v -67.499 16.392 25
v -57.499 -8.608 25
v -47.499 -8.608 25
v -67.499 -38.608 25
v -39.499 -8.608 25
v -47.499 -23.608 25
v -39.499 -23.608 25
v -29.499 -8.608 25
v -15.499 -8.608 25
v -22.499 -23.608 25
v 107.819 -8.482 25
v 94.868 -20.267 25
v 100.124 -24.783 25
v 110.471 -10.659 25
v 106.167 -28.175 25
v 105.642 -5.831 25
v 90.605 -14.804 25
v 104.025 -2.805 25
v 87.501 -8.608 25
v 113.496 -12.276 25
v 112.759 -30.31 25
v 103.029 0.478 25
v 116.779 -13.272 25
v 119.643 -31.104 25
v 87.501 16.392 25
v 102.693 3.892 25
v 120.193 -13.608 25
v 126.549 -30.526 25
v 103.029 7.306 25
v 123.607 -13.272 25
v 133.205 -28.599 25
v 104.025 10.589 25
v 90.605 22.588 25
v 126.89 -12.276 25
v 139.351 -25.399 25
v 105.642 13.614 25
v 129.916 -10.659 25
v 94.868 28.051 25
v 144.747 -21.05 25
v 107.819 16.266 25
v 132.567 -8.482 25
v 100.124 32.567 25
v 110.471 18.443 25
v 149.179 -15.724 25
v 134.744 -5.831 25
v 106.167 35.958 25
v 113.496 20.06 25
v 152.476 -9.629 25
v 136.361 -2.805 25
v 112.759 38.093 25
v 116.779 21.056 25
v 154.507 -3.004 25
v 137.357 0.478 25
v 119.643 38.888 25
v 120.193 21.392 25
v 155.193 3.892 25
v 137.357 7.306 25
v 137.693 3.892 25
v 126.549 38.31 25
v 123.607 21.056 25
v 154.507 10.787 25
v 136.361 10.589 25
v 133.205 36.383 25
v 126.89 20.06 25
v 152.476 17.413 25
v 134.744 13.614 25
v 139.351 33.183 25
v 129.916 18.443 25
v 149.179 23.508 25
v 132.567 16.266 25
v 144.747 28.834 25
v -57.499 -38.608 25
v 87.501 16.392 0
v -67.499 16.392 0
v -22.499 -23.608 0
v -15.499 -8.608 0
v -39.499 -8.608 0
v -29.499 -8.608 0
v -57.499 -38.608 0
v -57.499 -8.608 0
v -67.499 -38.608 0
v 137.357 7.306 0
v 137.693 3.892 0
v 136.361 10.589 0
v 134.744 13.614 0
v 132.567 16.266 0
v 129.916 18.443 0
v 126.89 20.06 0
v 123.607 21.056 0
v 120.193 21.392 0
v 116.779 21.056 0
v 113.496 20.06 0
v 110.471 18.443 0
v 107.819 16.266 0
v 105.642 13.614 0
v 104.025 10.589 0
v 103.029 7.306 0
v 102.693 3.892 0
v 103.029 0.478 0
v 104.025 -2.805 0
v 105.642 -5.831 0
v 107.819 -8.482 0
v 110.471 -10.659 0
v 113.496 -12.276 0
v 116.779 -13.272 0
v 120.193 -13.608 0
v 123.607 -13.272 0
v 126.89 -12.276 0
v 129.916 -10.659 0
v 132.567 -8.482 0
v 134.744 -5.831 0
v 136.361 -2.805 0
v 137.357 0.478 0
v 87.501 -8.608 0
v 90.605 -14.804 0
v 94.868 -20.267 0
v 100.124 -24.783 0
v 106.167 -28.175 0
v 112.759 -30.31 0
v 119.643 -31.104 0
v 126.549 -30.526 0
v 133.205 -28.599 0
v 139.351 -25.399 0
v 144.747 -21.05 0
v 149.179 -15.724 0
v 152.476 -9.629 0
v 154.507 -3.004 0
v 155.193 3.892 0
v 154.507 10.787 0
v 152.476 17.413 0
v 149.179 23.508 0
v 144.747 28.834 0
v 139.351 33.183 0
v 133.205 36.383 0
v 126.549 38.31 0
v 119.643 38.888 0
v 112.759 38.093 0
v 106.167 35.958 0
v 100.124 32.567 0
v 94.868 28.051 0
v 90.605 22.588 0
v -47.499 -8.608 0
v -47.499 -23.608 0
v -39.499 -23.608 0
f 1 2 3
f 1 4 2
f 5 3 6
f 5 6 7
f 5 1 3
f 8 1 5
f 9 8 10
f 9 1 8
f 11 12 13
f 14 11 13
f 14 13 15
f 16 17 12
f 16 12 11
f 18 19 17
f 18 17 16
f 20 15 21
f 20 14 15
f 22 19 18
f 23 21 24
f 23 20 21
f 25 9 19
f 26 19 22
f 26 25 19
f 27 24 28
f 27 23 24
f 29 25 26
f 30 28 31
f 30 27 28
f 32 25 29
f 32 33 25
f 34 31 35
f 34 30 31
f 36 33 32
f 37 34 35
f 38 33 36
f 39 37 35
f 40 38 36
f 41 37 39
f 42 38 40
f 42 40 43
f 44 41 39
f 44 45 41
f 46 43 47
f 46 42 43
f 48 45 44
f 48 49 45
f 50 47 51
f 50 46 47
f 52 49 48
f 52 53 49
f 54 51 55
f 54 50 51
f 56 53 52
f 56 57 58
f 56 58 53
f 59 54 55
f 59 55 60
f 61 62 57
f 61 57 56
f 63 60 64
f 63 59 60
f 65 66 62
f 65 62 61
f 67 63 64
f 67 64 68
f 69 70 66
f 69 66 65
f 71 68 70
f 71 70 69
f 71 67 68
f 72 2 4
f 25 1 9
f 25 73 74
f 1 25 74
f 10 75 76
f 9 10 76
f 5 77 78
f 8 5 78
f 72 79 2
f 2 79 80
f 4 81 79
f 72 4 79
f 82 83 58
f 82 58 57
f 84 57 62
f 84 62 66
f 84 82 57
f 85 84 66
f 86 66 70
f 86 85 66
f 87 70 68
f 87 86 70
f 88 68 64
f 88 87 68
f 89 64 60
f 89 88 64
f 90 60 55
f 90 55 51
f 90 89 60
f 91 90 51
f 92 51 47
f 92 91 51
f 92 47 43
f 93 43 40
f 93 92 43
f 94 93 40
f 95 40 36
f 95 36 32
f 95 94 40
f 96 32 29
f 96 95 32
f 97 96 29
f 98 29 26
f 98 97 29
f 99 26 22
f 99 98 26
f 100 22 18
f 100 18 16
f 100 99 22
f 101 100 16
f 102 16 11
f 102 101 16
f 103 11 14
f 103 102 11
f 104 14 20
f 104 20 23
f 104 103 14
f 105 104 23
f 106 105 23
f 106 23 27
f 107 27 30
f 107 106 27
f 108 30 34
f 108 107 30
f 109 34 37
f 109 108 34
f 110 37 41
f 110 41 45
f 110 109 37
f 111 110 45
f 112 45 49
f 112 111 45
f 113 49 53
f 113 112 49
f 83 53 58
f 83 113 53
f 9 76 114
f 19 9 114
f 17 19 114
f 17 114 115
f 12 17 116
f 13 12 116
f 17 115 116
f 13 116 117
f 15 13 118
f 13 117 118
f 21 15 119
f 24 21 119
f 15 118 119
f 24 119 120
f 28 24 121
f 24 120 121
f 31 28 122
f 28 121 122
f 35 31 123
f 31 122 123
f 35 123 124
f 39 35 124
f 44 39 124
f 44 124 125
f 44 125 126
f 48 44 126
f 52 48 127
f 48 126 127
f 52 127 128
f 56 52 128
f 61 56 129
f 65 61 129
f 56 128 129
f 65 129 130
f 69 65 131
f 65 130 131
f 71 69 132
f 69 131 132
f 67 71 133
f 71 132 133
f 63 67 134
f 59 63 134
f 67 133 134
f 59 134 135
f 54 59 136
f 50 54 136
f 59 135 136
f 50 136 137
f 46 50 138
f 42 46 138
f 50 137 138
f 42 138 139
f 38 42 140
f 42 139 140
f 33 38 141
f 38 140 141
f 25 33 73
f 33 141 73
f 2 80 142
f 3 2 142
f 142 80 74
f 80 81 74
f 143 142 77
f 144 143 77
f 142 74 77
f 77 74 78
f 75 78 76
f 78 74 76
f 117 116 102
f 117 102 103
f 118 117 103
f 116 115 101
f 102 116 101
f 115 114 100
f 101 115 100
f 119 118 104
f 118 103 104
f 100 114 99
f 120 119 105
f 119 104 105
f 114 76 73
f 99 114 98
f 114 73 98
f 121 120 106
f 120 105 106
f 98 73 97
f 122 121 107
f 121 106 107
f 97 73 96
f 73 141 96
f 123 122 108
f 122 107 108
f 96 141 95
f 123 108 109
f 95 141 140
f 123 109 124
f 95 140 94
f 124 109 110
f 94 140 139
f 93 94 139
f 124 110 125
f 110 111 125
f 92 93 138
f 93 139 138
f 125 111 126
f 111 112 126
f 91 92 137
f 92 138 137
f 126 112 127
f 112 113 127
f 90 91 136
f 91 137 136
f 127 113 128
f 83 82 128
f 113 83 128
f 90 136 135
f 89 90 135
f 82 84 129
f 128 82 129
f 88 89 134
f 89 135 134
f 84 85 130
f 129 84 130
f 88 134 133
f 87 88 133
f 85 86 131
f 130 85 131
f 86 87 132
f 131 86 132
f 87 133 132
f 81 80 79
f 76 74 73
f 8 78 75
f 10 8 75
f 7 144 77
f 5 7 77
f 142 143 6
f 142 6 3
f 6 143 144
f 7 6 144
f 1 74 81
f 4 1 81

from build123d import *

# Parameters (mm, degrees)
F0_W     = 10
F0_H     = 30
F0_W_2   = 8
F0_H_2   = 15
F0_R     = 17.5
F1_DEPTH = 25


# Not quite as in the source:
# - a feature of the source that left no trace in its solid (it failed there, or was rolled back) is left out


with BuildPart() as f1:
    # F0 (on Top) → F1 (new body)
    with BuildSketch(Plane.XY):
        with Locations((-62.4986458628, -23.6081185268)):
            Rectangle(F0_W, F0_H)
        with Locations((-43.4986458628, -16.1081185268)):
            Rectangle(F0_W_2, F0_H_2)
        Polygon((87.5013541372, 16.3918814732), (-67.4986458628, 16.3918814732), (-67.4986458628, -8.6081185268), (-57.4986458628, -8.6081185268), (-47.4986458628, -8.6081185268), (-39.4986458628, -8.6081185268), (-29.4986458628, -8.6081185268), (-15.4986458628, -8.6081185268), (87.5013541372, -8.6081185268), align=None)
        Polygon((-22.4986458628, -23.6081185268), (-15.4986458628, -8.6081185268), (-29.4986458628, -8.6081185268), align=None)
        with BuildLine():
            ThreePointArc((87.5013541372, -8.6081185268), (155.1930962138, 3.8918814732), (87.5013541372, 16.3918814732))
            Line((87.5013541372, 16.3918814732), (87.5013541372, -8.6081185268))
        make_face()
        with Locations((120.1930962138, 3.8918814732)):
            Circle(F0_R, mode=Mode.SUBTRACT)
    extrude(amount=F1_DEPTH)


solid = f1.part
